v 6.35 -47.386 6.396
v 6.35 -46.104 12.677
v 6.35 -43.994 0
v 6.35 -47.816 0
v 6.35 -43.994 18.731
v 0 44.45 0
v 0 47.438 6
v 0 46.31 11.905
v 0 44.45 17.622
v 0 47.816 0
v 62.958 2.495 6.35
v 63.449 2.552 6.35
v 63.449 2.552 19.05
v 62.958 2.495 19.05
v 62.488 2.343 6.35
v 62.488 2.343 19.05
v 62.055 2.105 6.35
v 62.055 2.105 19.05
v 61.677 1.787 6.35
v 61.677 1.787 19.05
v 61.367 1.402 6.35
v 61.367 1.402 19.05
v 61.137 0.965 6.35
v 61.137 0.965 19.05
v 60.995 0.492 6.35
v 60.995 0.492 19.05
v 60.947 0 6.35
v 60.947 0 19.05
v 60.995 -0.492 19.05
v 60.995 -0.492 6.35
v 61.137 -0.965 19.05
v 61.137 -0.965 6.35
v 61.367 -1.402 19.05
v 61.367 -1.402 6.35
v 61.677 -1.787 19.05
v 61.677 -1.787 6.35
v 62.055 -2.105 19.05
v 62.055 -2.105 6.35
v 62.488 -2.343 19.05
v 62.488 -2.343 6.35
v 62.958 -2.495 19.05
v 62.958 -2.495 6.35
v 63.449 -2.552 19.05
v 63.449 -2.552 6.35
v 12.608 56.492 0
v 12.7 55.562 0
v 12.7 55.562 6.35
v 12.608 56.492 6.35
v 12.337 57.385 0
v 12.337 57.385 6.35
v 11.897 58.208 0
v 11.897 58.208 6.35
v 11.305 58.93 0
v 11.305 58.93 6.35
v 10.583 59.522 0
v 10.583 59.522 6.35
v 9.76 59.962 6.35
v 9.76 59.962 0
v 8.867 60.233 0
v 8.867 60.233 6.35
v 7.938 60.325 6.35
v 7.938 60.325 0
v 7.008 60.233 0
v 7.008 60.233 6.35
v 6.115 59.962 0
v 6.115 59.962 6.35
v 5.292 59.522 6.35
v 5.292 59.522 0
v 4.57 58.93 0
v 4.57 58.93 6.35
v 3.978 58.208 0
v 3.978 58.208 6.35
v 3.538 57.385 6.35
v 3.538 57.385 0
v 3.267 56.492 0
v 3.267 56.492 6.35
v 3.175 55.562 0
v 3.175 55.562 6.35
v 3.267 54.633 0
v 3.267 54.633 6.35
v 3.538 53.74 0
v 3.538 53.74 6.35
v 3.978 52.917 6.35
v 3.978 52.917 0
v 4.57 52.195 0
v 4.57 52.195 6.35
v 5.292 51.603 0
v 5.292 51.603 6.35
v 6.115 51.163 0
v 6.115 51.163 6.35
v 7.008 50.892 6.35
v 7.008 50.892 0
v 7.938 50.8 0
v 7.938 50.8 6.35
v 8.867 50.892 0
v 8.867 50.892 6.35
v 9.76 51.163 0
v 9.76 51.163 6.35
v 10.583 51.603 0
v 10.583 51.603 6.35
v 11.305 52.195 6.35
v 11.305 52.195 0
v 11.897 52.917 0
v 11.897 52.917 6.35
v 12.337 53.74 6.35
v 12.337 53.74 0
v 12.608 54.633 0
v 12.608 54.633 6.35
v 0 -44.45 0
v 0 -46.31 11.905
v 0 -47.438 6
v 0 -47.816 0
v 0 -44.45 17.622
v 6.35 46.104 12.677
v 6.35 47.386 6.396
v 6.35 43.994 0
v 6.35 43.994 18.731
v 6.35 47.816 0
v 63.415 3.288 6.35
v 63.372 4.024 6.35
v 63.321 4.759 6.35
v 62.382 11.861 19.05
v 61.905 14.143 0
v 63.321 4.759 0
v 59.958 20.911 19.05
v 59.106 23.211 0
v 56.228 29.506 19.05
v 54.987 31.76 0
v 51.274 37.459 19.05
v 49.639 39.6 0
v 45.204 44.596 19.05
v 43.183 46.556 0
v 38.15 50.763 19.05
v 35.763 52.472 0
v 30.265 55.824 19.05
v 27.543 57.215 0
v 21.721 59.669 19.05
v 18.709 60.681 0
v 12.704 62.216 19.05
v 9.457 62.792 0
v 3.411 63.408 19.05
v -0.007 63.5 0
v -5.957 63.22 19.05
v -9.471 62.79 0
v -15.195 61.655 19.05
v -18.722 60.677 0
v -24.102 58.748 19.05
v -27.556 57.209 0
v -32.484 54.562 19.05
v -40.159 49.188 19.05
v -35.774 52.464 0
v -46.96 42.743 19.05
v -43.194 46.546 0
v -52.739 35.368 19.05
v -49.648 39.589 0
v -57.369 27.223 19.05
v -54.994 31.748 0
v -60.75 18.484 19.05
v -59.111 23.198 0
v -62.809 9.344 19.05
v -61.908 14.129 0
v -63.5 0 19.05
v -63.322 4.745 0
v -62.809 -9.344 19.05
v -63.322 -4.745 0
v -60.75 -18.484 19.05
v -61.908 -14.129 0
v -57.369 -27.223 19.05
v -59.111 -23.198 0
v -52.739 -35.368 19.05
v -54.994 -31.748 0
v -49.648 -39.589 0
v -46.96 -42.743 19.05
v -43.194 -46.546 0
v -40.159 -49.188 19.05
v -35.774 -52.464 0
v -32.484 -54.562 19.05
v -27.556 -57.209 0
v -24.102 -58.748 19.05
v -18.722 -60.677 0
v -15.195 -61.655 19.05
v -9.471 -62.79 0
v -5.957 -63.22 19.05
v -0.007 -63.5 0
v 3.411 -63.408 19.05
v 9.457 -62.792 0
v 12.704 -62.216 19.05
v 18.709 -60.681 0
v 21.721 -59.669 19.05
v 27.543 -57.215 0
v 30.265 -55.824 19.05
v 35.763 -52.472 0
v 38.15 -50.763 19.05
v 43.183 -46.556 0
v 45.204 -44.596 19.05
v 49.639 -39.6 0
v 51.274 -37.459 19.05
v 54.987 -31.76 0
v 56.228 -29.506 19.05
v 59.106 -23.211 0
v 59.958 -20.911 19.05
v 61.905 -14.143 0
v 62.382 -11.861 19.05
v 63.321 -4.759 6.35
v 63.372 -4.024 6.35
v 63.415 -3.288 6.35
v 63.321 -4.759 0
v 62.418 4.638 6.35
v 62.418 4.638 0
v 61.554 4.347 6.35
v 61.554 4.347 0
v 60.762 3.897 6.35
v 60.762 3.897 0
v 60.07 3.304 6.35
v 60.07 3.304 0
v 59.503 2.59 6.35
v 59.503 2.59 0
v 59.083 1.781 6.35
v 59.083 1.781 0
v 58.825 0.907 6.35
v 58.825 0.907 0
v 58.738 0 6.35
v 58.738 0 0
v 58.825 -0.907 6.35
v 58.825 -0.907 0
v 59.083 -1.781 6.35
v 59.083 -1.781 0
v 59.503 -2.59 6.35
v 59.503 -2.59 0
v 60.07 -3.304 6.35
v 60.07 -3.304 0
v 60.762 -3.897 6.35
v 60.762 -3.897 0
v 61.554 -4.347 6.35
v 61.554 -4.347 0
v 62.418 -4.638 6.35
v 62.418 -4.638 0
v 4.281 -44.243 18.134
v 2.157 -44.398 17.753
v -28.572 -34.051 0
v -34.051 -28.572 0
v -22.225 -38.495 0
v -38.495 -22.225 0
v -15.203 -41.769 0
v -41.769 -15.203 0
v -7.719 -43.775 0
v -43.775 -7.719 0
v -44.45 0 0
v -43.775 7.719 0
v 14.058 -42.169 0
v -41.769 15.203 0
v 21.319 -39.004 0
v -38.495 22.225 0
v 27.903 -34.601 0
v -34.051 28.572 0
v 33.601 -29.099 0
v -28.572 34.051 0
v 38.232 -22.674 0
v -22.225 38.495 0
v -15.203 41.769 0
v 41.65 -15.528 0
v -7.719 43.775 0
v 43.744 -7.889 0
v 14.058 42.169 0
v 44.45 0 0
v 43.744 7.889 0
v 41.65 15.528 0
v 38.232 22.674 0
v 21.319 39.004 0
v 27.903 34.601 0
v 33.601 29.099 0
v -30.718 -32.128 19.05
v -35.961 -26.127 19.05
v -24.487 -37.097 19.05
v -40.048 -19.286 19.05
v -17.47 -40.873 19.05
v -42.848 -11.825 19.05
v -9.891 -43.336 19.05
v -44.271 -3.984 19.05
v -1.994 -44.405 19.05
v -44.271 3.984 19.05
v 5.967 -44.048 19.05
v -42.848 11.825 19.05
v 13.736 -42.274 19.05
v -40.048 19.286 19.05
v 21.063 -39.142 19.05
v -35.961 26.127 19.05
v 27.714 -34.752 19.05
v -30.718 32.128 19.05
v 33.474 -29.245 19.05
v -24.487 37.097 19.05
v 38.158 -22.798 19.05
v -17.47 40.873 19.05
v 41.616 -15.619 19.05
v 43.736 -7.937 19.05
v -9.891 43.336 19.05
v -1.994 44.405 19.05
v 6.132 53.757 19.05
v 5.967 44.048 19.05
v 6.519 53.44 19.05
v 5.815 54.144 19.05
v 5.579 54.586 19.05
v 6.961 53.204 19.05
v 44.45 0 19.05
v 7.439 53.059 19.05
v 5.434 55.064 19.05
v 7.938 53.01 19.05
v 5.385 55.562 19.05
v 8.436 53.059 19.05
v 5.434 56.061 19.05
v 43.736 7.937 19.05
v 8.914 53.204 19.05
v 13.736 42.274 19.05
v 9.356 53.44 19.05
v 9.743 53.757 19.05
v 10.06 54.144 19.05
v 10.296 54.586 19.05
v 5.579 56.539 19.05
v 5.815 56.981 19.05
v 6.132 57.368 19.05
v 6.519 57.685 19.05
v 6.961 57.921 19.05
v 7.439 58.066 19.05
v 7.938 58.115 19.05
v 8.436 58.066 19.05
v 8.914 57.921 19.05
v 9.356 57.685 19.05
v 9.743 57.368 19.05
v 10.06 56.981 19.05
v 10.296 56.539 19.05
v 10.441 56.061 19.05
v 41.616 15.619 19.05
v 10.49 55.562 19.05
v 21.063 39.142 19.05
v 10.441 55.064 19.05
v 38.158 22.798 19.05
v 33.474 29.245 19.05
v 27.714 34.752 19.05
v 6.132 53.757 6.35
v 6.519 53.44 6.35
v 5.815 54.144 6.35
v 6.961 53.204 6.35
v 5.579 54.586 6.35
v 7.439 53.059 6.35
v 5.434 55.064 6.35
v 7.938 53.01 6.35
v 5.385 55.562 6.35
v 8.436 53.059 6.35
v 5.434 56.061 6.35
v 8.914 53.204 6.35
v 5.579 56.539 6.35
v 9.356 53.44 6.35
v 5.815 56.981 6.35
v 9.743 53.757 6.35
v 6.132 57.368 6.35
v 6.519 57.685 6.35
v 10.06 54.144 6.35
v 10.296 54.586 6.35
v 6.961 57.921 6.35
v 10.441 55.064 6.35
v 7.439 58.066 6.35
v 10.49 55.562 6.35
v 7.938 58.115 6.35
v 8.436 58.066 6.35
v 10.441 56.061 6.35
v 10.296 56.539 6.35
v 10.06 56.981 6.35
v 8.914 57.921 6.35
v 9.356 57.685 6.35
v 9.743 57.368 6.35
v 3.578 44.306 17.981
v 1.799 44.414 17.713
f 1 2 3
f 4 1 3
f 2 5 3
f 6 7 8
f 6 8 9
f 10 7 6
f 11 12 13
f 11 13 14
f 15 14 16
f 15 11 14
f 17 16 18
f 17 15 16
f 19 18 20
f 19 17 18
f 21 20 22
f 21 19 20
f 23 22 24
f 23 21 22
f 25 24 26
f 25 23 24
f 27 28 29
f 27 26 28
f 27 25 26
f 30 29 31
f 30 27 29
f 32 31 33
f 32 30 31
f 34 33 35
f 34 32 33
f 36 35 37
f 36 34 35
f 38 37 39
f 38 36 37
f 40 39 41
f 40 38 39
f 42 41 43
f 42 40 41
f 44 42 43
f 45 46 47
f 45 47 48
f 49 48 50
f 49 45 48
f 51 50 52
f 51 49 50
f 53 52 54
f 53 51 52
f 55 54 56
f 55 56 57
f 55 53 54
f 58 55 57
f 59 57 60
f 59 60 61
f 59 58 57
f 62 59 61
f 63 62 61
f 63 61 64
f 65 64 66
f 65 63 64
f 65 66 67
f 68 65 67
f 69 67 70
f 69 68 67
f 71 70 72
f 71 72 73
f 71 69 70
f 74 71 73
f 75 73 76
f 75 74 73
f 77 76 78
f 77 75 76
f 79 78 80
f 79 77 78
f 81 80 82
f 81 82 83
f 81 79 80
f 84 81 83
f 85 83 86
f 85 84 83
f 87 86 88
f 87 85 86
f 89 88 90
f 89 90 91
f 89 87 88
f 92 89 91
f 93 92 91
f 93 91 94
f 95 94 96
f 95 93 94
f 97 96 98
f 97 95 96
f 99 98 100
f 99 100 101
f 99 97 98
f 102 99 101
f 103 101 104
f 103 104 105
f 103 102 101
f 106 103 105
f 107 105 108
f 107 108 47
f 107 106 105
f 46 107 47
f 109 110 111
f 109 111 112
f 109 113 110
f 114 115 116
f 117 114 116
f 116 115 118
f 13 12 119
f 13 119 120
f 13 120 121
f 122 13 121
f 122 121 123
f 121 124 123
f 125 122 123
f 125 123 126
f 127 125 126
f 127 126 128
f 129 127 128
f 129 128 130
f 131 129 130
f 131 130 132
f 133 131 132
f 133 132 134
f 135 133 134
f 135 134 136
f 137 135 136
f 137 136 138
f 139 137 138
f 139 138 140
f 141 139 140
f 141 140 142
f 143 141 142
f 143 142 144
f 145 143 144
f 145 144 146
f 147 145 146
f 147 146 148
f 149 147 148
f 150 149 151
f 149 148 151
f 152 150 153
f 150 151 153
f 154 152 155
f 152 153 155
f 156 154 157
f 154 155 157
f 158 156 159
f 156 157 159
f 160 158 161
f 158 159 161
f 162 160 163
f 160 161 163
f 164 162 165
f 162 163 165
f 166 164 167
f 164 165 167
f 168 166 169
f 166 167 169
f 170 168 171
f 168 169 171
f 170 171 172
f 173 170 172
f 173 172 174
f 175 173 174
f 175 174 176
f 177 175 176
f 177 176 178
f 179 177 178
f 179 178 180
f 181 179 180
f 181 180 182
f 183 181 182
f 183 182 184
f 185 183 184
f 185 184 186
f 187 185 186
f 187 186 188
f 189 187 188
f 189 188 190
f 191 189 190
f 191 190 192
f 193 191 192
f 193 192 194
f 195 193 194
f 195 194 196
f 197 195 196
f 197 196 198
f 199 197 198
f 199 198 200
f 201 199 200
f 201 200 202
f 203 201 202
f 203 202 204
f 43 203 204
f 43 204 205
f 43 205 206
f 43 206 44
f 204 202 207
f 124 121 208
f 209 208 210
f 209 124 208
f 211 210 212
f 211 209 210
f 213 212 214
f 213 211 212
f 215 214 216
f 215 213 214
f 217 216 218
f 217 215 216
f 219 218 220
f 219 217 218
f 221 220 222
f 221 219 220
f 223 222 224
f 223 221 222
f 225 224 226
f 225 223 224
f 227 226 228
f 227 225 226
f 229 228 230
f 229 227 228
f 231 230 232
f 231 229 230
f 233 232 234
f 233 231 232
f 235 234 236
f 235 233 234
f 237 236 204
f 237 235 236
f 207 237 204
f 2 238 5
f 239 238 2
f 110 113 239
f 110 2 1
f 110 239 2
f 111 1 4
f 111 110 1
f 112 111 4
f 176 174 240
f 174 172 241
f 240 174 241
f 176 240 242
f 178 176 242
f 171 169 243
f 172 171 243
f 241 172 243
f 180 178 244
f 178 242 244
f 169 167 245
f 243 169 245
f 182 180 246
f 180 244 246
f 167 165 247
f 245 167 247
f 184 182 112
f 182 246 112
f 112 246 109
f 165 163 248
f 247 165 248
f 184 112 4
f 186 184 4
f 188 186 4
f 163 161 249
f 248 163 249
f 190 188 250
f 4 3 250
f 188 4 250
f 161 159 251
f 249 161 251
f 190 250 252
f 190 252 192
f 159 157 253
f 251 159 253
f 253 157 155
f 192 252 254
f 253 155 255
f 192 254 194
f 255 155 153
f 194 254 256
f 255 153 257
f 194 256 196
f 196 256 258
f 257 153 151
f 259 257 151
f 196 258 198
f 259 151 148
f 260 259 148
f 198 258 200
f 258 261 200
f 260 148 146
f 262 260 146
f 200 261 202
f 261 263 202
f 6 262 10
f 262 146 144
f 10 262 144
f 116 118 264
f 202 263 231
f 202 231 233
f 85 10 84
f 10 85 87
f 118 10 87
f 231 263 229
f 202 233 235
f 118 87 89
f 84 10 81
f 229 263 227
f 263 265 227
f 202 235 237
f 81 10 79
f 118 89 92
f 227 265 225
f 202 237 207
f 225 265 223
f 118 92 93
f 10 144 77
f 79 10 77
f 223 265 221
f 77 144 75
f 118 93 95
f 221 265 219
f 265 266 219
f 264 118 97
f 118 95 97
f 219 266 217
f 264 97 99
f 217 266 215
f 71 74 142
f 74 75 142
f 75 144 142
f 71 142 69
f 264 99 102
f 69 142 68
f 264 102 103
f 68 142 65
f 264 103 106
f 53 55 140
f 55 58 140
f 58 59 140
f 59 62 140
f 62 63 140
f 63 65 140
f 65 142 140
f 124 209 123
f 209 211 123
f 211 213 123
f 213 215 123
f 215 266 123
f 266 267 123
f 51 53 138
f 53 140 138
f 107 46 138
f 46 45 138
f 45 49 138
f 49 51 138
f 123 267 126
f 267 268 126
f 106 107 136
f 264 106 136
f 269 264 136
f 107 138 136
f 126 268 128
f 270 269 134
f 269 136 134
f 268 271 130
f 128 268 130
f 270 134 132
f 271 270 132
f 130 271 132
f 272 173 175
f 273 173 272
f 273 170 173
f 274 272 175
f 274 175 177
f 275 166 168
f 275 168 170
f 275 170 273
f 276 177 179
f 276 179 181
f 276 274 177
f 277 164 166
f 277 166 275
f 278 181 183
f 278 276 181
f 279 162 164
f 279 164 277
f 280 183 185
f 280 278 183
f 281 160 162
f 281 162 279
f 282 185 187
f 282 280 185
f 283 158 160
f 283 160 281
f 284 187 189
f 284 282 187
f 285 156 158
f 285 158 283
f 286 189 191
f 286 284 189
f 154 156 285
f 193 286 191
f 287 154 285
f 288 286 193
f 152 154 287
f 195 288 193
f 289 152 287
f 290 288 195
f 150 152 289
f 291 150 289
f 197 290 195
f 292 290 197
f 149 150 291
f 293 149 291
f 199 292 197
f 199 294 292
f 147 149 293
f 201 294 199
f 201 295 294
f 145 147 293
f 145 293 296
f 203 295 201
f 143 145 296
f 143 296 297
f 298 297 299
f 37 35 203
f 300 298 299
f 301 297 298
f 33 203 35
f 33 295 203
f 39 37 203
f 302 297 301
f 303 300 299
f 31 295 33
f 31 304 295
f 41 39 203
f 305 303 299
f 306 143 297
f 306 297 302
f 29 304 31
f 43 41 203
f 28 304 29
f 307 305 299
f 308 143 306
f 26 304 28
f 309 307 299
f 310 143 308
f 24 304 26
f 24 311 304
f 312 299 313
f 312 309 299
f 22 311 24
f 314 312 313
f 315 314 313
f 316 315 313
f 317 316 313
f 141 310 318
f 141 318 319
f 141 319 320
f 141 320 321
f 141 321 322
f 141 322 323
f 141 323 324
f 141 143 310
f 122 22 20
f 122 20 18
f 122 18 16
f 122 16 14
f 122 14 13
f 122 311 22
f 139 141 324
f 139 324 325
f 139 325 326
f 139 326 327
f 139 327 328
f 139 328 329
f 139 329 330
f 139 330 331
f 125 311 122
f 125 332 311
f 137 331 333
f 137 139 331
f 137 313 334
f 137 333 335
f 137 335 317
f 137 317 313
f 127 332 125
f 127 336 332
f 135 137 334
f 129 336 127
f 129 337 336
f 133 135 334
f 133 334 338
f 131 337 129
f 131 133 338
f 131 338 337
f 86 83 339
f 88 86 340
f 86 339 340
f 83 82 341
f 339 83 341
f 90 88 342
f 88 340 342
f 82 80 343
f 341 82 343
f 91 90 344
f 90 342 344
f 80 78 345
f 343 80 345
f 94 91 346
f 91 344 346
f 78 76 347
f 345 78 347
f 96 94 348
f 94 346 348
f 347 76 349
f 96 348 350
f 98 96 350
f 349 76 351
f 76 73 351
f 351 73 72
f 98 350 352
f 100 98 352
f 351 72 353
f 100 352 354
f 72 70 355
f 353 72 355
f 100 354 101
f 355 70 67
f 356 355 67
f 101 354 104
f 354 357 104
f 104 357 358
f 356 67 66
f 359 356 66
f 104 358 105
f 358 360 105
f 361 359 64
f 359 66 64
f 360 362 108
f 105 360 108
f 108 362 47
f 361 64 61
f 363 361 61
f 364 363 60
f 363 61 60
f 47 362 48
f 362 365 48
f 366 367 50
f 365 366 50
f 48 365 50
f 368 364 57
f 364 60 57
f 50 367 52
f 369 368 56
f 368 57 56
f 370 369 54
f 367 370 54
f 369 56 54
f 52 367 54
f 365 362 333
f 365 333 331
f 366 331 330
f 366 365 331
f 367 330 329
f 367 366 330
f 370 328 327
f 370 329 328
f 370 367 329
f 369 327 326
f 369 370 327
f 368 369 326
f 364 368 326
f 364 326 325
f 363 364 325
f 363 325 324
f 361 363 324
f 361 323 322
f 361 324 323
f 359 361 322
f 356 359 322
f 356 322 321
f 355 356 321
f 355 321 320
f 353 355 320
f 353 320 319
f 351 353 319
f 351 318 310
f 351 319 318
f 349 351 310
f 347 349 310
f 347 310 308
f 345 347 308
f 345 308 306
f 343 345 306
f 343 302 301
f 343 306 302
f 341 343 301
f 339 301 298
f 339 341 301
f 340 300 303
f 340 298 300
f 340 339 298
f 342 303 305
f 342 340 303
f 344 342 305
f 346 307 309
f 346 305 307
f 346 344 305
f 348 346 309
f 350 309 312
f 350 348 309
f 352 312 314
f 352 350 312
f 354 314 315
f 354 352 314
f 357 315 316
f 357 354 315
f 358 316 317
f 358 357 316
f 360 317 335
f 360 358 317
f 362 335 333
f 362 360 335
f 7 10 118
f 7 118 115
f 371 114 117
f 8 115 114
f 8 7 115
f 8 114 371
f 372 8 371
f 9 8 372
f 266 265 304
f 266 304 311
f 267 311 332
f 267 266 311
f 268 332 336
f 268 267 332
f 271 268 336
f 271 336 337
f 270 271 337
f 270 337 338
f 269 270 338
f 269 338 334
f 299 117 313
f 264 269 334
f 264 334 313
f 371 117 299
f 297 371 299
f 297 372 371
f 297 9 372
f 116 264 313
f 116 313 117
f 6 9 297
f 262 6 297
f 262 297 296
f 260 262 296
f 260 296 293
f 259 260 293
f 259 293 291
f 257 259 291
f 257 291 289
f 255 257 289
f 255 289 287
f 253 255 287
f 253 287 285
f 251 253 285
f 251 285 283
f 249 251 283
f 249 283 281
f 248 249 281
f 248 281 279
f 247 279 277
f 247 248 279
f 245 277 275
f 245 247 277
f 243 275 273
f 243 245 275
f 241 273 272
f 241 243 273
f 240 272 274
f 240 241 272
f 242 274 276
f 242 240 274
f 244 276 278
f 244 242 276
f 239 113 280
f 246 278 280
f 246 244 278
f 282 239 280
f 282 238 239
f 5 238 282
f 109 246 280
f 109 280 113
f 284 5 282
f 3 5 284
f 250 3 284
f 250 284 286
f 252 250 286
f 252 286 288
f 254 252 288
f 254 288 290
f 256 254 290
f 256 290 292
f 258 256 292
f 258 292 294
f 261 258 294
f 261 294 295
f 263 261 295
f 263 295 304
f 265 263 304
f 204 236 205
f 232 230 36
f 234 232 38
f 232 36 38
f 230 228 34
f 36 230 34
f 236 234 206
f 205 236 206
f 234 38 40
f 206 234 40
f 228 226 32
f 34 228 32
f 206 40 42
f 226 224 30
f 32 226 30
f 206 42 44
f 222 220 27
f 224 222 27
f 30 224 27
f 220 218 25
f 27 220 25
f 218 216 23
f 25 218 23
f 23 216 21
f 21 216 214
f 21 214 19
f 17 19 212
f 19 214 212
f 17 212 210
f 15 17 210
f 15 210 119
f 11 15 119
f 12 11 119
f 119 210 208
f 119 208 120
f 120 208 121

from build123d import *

# Parameters (mm, degrees)
SKETCH1_R           = 63.5
BOSS_EXTRUDE1_DEPTH = 19.05
SKETCH2_R           = 44.45
CUT_EXTRUDE1_DEPTH  = 92.800885072
SKETCH3_R           = 47.8155
CUT_EXTRUDE2_DEPTH  = 6.35
SKETCH4_R           = 2.5527
CUT_EXTRUDE3_DEPTH  = 92.800885093
SKETCH5_R           = 4.7625
CUT_EXTRUDE4_DEPTH  = 6.35


with BuildPart() as part:
    # Sketch1 → Boss-Extrude1 (new body)
    with BuildSketch(Plane.XY):
        Circle(SKETCH1_R)
    extrude(amount=BOSS_EXTRUDE1_DEPTH)

    # Sketch2 → Cut-Extrude1 (cut, through all)
    with BuildSketch(Plane.XY):
        Circle(SKETCH2_R)
    extrude(amount=CUT_EXTRUDE1_DEPTH, mode=Mode.SUBTRACT)

    # Sketch3 → Cut-Extrude2 (cut)
    with BuildSketch(Plane(origin=(0, 0, 0), x_dir=(0, 0, -1), z_dir=(1, 0, 0))):
        Circle(SKETCH3_R)
    extrude(amount=CUT_EXTRUDE2_DEPTH, mode=Mode.SUBTRACT)

    # Sketch4 → Cut-Extrude3 (cut, through all)
    with BuildSketch(Plane.XY):
        with Locations((63.5, 111.125)):
            Circle(SKETCH4_R)
        with Locations((7.9375, 55.5625)):
            Circle(SKETCH4_R)
        with Locations((63.5, 0)):
            Circle(SKETCH4_R)
        with Locations((119.0625, 55.5625)):
            Circle(SKETCH4_R)
    extrude(amount=CUT_EXTRUDE3_DEPTH, mode=Mode.SUBTRACT)

    # Sketch5 → Cut-Extrude4 (cut)
    with BuildSketch(Plane.XY):
        with Locations((63.5, 111.125)):
            Circle(SKETCH5_R)
        with Locations((7.9375, 55.5625)):
            Circle(SKETCH5_R)
        with Locations((63.5, 0)):
            Circle(SKETCH5_R)
        with Locations((119.0625, 55.5625)):
            Circle(SKETCH5_R)
    extrude(amount=CUT_EXTRUDE4_DEPTH, mode=Mode.SUBTRACT)


solid = part.part
